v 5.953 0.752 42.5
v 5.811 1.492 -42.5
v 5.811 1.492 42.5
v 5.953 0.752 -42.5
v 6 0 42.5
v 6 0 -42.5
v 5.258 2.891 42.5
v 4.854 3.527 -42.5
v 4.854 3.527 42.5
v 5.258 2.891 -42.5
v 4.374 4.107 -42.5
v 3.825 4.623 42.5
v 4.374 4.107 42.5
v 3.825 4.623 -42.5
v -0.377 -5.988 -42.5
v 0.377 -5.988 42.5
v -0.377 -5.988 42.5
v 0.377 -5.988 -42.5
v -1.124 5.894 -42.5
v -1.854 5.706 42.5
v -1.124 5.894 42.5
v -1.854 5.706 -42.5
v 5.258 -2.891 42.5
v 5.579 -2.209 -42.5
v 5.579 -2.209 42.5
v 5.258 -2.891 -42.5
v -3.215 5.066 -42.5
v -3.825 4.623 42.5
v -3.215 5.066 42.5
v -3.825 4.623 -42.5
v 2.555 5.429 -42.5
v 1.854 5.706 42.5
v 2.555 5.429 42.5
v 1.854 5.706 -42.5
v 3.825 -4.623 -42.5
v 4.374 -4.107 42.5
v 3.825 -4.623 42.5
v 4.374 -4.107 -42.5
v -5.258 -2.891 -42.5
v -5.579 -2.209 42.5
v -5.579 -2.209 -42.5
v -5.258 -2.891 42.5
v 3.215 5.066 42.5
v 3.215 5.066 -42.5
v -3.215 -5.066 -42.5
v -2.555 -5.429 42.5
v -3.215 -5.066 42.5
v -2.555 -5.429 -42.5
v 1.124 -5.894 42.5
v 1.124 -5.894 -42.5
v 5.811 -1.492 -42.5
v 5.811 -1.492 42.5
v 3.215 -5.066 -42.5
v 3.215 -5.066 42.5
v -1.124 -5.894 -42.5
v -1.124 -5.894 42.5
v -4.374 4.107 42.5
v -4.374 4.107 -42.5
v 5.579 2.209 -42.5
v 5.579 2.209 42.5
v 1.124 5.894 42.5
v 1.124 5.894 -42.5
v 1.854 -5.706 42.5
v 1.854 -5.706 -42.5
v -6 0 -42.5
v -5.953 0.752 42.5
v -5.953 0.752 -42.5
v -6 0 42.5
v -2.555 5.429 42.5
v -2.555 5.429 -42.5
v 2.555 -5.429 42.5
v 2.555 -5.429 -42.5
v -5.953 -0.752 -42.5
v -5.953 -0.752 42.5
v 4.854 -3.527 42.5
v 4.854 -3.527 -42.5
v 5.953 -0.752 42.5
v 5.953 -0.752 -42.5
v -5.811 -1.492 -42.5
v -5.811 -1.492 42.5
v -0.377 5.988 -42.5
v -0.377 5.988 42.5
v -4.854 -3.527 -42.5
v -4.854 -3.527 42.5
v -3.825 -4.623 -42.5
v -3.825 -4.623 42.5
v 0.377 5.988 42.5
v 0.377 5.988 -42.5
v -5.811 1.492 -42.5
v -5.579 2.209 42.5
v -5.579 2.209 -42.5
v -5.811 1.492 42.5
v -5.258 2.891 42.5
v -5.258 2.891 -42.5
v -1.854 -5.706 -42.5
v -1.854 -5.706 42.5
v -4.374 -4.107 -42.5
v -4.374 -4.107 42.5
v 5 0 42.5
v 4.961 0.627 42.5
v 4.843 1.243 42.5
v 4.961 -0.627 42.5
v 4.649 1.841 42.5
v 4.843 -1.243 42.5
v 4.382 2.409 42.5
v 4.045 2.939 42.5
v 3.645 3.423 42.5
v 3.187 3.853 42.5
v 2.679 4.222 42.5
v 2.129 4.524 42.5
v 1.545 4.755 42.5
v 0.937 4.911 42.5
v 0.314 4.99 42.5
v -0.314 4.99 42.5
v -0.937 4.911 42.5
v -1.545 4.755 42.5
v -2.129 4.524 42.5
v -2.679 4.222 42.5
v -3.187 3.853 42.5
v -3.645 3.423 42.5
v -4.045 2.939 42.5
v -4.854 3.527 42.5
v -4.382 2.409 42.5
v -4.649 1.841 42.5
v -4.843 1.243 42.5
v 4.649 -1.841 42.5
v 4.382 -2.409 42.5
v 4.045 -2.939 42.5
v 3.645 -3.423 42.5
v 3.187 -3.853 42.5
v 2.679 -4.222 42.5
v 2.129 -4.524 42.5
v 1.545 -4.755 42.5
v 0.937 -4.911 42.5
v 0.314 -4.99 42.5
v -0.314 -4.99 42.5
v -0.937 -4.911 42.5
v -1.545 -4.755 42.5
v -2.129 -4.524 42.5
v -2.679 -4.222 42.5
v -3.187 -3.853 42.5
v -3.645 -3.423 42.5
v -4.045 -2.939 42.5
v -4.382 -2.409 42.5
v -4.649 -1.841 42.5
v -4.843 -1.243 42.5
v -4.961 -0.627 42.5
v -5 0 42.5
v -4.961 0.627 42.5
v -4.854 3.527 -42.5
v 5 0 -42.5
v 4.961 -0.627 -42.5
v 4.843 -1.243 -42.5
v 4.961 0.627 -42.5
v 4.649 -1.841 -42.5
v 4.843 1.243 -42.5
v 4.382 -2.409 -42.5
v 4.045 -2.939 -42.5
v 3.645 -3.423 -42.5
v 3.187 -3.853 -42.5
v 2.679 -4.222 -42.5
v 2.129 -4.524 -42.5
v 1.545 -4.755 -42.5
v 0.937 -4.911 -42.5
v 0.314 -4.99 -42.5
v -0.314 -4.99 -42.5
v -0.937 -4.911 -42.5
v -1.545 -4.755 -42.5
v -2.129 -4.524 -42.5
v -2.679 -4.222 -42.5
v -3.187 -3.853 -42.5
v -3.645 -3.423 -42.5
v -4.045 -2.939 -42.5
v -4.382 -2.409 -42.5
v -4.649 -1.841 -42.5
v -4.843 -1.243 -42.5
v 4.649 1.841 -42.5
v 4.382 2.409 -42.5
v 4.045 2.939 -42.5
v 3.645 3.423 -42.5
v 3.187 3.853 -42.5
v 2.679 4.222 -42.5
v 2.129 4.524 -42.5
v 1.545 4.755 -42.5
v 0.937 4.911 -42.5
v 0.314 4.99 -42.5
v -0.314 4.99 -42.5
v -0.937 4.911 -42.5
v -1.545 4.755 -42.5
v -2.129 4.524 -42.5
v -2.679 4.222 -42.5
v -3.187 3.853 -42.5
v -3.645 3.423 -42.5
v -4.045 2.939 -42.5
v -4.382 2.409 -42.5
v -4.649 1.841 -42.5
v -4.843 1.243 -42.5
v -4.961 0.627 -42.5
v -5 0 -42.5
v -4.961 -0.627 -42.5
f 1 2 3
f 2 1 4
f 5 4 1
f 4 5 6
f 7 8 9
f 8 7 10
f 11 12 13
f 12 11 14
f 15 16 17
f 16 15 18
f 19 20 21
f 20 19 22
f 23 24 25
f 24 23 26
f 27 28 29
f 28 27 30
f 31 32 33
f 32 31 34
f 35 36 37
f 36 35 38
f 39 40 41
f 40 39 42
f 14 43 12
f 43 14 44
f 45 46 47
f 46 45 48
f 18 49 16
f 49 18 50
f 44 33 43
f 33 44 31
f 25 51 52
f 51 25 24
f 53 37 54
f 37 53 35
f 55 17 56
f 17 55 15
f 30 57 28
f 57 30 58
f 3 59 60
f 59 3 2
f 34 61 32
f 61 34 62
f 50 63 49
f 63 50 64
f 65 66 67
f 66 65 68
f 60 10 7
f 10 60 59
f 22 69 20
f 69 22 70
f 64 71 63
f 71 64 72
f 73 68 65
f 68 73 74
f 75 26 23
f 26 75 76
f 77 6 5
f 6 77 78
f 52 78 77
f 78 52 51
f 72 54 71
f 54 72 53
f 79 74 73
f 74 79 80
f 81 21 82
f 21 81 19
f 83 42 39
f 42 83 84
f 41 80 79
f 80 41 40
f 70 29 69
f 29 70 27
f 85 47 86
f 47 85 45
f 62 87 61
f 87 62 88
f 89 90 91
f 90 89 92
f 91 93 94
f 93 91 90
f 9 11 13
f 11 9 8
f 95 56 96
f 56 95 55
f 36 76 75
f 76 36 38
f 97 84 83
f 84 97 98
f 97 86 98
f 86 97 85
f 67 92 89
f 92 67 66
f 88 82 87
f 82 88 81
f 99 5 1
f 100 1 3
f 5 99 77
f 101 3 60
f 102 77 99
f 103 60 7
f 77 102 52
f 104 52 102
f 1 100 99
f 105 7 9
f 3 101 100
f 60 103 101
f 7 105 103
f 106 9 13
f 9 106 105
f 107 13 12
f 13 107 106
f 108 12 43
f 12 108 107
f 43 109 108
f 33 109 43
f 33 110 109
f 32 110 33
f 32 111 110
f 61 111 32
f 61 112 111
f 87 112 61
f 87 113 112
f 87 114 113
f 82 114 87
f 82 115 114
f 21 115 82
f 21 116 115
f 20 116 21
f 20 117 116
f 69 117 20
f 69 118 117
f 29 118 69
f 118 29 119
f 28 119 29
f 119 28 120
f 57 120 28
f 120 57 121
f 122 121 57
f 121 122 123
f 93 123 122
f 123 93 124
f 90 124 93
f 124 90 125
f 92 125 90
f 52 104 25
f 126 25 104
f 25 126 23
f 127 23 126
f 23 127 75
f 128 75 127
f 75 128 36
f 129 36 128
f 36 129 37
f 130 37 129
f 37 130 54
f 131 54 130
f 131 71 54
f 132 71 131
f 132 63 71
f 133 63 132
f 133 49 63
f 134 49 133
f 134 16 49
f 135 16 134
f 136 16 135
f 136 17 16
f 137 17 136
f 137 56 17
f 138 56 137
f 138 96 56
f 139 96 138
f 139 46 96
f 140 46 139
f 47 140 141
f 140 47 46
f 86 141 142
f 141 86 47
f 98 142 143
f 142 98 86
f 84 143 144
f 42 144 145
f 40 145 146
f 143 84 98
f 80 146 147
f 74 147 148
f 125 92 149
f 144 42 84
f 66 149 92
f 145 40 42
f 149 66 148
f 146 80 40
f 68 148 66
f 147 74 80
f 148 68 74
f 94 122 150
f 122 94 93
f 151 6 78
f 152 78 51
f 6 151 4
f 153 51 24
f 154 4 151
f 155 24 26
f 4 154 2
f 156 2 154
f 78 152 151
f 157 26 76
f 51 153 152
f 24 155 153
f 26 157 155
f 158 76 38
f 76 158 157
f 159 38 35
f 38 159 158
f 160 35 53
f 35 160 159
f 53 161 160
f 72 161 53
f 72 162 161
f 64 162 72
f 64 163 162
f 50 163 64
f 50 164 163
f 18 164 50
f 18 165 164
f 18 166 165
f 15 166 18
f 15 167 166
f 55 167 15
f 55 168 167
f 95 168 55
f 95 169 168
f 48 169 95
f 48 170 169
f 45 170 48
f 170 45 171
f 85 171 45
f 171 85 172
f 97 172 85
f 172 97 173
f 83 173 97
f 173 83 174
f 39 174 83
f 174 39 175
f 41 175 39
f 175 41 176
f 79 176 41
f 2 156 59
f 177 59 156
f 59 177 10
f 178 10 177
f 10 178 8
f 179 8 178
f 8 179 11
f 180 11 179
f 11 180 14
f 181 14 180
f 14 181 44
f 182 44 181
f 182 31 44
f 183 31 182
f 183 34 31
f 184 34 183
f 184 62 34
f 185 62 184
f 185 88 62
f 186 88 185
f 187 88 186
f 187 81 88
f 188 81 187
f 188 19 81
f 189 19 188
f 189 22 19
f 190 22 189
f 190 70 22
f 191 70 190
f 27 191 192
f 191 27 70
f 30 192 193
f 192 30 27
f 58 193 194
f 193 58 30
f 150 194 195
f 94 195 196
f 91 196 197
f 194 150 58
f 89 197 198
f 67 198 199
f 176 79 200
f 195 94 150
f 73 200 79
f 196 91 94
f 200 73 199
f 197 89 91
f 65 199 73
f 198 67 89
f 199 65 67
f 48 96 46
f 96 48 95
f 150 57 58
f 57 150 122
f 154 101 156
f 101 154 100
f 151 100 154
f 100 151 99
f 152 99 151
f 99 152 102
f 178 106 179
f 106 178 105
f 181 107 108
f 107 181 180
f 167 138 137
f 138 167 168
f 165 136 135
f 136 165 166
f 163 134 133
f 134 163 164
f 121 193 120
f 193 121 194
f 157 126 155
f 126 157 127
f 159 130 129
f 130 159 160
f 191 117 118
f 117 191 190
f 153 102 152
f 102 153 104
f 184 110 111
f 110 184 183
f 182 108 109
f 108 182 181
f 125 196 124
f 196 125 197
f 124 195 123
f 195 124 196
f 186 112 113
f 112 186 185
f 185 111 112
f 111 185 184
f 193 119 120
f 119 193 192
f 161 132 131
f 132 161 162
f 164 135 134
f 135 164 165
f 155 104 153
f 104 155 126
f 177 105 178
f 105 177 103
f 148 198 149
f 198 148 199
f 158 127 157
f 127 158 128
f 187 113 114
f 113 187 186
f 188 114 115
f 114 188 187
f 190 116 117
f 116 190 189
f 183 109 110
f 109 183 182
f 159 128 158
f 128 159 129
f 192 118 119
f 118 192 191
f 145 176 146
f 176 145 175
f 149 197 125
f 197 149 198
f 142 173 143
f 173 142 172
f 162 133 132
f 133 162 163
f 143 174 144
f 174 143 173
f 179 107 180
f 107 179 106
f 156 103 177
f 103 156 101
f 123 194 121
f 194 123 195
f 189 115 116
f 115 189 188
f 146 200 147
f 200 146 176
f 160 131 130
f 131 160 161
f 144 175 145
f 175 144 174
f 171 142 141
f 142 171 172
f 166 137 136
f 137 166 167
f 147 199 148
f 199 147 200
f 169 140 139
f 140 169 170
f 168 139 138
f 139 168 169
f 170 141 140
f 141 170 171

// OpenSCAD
$fn = 50;


difference() {
	union() {
		translate(v = [0, 0, -42.5000000000]) {
			cylinder(h = 85, r = 6.0000000000);
		}
	}
	union() {
		translate(v = [0, 0, -100.0000000000]) {
			cylinder(h = 200, r = 5.0000000000);
		}
	}
}
